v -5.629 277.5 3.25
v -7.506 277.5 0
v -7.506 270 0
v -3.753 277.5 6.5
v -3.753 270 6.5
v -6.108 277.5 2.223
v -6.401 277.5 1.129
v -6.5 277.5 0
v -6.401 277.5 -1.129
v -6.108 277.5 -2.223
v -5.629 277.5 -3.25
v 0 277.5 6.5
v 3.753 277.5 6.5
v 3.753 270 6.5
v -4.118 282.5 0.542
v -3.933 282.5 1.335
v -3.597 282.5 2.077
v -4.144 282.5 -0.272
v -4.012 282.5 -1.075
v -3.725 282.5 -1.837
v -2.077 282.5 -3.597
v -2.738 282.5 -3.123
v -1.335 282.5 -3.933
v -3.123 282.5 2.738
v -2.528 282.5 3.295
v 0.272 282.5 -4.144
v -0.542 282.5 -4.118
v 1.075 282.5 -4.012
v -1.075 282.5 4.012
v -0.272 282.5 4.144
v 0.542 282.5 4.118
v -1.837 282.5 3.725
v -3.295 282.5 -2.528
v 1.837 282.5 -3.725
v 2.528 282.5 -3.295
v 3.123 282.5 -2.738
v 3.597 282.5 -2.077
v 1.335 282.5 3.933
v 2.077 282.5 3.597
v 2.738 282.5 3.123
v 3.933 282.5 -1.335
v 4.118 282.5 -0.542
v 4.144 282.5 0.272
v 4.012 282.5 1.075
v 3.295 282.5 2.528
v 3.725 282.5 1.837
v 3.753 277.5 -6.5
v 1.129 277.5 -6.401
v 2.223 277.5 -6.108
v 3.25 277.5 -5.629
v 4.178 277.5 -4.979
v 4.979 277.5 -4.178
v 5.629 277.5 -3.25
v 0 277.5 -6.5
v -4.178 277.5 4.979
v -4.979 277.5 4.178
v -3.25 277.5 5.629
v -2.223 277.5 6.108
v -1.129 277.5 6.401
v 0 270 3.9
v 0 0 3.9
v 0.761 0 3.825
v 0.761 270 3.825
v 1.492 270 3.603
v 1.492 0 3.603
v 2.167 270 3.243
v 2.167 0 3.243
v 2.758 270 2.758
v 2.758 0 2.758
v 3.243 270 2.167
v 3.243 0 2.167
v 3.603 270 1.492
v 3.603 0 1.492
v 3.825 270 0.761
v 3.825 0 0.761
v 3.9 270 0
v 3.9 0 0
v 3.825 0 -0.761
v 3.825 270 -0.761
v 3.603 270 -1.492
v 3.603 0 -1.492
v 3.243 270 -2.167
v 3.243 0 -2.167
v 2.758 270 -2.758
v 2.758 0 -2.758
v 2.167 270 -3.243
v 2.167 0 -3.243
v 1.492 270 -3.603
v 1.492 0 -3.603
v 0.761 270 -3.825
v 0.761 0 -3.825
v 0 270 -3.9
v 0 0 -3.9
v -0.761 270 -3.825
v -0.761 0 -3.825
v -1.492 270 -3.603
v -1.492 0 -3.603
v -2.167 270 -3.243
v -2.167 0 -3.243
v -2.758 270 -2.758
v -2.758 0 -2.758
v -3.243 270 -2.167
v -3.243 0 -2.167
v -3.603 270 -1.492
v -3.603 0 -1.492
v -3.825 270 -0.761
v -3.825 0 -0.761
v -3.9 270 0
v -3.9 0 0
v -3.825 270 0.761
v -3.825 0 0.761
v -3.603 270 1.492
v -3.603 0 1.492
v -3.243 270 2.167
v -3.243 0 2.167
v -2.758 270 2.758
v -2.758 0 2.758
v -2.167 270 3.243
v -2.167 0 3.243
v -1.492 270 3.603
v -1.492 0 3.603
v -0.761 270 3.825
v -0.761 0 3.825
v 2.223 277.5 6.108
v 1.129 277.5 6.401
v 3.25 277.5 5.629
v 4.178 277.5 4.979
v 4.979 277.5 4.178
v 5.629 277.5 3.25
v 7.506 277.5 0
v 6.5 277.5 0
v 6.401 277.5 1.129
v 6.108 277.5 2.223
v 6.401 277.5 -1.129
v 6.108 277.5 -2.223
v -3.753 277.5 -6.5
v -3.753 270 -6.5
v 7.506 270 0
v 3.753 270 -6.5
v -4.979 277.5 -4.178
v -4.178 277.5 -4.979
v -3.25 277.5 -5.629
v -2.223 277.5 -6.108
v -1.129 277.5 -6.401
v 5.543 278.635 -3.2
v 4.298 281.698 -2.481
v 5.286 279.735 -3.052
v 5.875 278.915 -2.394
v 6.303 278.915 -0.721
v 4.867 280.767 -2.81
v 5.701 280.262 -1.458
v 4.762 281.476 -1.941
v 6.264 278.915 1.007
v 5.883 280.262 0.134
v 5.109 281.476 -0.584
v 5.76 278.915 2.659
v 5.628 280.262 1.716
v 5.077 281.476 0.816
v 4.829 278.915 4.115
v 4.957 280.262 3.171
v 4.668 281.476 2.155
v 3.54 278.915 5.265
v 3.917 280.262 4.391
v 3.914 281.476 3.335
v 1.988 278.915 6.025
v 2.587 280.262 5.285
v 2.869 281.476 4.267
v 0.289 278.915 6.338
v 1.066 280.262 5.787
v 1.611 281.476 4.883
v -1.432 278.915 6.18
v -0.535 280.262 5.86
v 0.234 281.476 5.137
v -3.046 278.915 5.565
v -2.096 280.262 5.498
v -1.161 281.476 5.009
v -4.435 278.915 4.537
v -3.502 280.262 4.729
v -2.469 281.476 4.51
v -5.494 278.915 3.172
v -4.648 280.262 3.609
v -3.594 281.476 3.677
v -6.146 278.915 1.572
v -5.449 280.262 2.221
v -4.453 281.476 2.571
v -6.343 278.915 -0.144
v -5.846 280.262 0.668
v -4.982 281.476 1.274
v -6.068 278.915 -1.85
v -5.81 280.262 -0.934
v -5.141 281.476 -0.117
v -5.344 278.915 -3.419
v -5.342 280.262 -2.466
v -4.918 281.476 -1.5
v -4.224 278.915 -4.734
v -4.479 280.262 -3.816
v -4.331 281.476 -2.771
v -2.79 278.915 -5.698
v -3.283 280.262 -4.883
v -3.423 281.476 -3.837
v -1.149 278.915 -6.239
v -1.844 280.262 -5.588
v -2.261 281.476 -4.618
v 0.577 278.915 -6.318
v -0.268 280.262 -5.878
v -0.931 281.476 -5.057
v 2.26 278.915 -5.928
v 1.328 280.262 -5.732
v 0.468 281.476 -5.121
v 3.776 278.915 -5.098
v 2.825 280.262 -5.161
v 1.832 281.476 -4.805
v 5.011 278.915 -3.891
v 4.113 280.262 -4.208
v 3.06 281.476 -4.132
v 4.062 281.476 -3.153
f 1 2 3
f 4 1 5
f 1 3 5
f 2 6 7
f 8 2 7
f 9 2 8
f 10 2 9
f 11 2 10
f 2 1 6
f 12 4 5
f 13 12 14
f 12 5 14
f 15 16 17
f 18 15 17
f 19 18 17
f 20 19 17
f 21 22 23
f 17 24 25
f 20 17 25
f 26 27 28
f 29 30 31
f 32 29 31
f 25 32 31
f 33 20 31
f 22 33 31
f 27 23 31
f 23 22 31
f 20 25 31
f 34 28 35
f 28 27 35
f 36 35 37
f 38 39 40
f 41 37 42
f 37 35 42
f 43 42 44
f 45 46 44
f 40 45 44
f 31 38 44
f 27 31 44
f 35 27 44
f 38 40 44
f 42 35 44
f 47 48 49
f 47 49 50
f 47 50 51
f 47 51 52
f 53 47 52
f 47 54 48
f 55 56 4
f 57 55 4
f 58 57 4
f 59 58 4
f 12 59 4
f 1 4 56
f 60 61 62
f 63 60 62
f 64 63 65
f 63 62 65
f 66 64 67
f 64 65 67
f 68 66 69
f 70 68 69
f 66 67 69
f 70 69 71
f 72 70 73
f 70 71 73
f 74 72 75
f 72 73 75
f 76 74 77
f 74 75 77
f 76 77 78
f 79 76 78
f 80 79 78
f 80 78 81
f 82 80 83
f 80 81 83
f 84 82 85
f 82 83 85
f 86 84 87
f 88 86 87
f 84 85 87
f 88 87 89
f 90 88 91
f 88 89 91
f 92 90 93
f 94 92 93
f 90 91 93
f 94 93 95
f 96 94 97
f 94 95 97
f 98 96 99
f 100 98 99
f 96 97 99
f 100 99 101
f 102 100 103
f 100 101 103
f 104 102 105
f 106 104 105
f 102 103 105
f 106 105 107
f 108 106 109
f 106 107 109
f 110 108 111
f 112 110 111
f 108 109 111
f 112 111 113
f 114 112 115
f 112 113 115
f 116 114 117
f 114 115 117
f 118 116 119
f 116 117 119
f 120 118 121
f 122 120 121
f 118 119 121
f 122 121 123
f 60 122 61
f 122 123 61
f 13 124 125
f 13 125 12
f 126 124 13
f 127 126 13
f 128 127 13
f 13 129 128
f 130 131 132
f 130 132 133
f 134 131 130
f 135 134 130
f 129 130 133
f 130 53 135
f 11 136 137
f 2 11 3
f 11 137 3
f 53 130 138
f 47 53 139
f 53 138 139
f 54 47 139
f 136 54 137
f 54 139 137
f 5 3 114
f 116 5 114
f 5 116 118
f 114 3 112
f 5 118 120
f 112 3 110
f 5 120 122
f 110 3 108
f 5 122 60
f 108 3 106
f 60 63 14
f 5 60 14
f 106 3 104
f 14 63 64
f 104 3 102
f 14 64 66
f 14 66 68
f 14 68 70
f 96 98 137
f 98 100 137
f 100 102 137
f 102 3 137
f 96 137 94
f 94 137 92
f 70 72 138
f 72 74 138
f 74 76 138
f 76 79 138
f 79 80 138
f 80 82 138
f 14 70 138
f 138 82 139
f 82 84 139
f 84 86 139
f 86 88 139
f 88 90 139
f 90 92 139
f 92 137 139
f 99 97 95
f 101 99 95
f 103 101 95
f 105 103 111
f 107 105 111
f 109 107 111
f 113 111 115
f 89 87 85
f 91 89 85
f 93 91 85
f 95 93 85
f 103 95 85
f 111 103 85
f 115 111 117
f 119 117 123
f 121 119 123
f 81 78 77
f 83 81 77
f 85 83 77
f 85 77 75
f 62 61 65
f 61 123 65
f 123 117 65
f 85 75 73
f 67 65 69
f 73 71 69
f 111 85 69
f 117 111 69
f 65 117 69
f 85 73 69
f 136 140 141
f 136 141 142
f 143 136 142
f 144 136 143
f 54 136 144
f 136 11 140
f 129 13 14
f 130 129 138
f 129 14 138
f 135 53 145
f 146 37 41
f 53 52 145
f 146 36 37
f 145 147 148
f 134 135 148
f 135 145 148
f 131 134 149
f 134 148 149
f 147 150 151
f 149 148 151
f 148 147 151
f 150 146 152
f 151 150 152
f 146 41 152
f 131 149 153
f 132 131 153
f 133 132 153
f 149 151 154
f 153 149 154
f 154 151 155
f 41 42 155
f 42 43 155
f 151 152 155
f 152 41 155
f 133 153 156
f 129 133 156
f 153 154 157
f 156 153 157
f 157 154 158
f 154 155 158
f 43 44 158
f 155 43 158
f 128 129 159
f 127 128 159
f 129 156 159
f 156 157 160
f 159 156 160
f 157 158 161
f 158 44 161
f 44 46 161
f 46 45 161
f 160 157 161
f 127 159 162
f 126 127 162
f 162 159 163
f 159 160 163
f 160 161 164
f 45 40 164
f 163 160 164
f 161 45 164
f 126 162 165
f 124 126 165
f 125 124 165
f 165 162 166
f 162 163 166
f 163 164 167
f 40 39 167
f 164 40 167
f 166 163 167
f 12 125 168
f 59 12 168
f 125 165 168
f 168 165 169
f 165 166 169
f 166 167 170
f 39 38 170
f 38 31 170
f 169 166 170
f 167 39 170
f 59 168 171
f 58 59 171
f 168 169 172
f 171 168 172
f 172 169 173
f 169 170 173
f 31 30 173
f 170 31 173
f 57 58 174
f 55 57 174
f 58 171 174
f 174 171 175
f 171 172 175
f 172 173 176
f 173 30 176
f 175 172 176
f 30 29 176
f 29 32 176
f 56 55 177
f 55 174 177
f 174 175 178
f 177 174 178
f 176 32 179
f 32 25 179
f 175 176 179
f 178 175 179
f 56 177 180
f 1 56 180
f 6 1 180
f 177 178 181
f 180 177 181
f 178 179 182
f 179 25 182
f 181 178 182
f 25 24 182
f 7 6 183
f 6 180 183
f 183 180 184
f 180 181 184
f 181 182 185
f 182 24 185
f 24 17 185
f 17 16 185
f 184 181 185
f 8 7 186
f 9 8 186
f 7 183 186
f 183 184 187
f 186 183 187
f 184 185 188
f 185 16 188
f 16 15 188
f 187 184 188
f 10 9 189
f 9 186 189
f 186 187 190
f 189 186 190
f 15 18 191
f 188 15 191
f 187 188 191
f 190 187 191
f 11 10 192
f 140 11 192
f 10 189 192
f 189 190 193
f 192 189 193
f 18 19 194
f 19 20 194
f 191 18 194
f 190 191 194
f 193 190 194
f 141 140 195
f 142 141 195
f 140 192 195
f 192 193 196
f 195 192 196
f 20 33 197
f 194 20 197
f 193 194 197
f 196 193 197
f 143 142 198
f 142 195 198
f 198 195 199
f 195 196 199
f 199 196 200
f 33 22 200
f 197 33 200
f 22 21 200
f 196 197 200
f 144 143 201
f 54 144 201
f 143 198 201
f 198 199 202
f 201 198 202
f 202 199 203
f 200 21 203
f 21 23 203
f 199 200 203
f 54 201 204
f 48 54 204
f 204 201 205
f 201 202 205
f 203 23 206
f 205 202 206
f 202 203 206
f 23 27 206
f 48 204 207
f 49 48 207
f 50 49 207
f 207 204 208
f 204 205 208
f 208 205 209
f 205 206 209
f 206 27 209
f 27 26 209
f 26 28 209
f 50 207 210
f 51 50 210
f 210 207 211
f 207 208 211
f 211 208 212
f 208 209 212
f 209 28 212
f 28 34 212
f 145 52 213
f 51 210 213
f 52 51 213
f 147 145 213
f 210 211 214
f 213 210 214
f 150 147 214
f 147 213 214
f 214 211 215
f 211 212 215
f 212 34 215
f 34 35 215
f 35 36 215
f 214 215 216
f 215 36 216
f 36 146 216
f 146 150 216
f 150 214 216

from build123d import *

# Parameters (mm, degrees)
SKETCH1_R           = 3.9
BOSS_EXTRUDE1_DEPTH = 270
BOSS_EXTRUDE2_DEPTH = 7.5


with BuildPart() as part:
    # Sketch1 → Boss-Extrude1 (new body)
    with BuildSketch(Plane(origin=(0, 0, 0), x_dir=(1, 0, 0), z_dir=(0, 1, 0))):
        with Locations(Location((0, 0, 0), (0, 0, 270))):
            Circle(SKETCH1_R)
    extrude(amount=BOSS_EXTRUDE1_DEPTH)

    # Sketch2 → Boss-Extrude2 (add)
    with BuildSketch(Plane(origin=(0, 270, 0), x_dir=(1, 0, 0), z_dir=(0, 1, 0))):
        Polygon((7.505553499, 0), (3.75277675, 6.5), (-3.75277675, 6.5), (-7.505553499, 0), (-3.75277675, -6.5), (3.75277675, -6.5), align=None)
    extrude(amount=BOSS_EXTRUDE2_DEPTH)

    # Sketch5 → Revolve2 (revolve)
    with BuildSketch(Plane(origin=(0, 0, 0), x_dir=(0.8660254037844384, 0, -0.5000000000000007), z_dir=(0.5000000000000006, 0, 0.8660254037844383))):
        with BuildLine():
            Line((0, 277.5), (6.5, 277.5))
            ThreePointArc((6.5, 277.5), (5.884153616, 280.261654617), (4.153311931, 282.5))
            Line((4.153311931, 282.5), (0, 282.5))
            Line((0, 282.5), (0, 277.5))
        make_face()
    revolve(axis=Axis((0, 282.5, 0), (0, -1, 0)))


solid = part.part
